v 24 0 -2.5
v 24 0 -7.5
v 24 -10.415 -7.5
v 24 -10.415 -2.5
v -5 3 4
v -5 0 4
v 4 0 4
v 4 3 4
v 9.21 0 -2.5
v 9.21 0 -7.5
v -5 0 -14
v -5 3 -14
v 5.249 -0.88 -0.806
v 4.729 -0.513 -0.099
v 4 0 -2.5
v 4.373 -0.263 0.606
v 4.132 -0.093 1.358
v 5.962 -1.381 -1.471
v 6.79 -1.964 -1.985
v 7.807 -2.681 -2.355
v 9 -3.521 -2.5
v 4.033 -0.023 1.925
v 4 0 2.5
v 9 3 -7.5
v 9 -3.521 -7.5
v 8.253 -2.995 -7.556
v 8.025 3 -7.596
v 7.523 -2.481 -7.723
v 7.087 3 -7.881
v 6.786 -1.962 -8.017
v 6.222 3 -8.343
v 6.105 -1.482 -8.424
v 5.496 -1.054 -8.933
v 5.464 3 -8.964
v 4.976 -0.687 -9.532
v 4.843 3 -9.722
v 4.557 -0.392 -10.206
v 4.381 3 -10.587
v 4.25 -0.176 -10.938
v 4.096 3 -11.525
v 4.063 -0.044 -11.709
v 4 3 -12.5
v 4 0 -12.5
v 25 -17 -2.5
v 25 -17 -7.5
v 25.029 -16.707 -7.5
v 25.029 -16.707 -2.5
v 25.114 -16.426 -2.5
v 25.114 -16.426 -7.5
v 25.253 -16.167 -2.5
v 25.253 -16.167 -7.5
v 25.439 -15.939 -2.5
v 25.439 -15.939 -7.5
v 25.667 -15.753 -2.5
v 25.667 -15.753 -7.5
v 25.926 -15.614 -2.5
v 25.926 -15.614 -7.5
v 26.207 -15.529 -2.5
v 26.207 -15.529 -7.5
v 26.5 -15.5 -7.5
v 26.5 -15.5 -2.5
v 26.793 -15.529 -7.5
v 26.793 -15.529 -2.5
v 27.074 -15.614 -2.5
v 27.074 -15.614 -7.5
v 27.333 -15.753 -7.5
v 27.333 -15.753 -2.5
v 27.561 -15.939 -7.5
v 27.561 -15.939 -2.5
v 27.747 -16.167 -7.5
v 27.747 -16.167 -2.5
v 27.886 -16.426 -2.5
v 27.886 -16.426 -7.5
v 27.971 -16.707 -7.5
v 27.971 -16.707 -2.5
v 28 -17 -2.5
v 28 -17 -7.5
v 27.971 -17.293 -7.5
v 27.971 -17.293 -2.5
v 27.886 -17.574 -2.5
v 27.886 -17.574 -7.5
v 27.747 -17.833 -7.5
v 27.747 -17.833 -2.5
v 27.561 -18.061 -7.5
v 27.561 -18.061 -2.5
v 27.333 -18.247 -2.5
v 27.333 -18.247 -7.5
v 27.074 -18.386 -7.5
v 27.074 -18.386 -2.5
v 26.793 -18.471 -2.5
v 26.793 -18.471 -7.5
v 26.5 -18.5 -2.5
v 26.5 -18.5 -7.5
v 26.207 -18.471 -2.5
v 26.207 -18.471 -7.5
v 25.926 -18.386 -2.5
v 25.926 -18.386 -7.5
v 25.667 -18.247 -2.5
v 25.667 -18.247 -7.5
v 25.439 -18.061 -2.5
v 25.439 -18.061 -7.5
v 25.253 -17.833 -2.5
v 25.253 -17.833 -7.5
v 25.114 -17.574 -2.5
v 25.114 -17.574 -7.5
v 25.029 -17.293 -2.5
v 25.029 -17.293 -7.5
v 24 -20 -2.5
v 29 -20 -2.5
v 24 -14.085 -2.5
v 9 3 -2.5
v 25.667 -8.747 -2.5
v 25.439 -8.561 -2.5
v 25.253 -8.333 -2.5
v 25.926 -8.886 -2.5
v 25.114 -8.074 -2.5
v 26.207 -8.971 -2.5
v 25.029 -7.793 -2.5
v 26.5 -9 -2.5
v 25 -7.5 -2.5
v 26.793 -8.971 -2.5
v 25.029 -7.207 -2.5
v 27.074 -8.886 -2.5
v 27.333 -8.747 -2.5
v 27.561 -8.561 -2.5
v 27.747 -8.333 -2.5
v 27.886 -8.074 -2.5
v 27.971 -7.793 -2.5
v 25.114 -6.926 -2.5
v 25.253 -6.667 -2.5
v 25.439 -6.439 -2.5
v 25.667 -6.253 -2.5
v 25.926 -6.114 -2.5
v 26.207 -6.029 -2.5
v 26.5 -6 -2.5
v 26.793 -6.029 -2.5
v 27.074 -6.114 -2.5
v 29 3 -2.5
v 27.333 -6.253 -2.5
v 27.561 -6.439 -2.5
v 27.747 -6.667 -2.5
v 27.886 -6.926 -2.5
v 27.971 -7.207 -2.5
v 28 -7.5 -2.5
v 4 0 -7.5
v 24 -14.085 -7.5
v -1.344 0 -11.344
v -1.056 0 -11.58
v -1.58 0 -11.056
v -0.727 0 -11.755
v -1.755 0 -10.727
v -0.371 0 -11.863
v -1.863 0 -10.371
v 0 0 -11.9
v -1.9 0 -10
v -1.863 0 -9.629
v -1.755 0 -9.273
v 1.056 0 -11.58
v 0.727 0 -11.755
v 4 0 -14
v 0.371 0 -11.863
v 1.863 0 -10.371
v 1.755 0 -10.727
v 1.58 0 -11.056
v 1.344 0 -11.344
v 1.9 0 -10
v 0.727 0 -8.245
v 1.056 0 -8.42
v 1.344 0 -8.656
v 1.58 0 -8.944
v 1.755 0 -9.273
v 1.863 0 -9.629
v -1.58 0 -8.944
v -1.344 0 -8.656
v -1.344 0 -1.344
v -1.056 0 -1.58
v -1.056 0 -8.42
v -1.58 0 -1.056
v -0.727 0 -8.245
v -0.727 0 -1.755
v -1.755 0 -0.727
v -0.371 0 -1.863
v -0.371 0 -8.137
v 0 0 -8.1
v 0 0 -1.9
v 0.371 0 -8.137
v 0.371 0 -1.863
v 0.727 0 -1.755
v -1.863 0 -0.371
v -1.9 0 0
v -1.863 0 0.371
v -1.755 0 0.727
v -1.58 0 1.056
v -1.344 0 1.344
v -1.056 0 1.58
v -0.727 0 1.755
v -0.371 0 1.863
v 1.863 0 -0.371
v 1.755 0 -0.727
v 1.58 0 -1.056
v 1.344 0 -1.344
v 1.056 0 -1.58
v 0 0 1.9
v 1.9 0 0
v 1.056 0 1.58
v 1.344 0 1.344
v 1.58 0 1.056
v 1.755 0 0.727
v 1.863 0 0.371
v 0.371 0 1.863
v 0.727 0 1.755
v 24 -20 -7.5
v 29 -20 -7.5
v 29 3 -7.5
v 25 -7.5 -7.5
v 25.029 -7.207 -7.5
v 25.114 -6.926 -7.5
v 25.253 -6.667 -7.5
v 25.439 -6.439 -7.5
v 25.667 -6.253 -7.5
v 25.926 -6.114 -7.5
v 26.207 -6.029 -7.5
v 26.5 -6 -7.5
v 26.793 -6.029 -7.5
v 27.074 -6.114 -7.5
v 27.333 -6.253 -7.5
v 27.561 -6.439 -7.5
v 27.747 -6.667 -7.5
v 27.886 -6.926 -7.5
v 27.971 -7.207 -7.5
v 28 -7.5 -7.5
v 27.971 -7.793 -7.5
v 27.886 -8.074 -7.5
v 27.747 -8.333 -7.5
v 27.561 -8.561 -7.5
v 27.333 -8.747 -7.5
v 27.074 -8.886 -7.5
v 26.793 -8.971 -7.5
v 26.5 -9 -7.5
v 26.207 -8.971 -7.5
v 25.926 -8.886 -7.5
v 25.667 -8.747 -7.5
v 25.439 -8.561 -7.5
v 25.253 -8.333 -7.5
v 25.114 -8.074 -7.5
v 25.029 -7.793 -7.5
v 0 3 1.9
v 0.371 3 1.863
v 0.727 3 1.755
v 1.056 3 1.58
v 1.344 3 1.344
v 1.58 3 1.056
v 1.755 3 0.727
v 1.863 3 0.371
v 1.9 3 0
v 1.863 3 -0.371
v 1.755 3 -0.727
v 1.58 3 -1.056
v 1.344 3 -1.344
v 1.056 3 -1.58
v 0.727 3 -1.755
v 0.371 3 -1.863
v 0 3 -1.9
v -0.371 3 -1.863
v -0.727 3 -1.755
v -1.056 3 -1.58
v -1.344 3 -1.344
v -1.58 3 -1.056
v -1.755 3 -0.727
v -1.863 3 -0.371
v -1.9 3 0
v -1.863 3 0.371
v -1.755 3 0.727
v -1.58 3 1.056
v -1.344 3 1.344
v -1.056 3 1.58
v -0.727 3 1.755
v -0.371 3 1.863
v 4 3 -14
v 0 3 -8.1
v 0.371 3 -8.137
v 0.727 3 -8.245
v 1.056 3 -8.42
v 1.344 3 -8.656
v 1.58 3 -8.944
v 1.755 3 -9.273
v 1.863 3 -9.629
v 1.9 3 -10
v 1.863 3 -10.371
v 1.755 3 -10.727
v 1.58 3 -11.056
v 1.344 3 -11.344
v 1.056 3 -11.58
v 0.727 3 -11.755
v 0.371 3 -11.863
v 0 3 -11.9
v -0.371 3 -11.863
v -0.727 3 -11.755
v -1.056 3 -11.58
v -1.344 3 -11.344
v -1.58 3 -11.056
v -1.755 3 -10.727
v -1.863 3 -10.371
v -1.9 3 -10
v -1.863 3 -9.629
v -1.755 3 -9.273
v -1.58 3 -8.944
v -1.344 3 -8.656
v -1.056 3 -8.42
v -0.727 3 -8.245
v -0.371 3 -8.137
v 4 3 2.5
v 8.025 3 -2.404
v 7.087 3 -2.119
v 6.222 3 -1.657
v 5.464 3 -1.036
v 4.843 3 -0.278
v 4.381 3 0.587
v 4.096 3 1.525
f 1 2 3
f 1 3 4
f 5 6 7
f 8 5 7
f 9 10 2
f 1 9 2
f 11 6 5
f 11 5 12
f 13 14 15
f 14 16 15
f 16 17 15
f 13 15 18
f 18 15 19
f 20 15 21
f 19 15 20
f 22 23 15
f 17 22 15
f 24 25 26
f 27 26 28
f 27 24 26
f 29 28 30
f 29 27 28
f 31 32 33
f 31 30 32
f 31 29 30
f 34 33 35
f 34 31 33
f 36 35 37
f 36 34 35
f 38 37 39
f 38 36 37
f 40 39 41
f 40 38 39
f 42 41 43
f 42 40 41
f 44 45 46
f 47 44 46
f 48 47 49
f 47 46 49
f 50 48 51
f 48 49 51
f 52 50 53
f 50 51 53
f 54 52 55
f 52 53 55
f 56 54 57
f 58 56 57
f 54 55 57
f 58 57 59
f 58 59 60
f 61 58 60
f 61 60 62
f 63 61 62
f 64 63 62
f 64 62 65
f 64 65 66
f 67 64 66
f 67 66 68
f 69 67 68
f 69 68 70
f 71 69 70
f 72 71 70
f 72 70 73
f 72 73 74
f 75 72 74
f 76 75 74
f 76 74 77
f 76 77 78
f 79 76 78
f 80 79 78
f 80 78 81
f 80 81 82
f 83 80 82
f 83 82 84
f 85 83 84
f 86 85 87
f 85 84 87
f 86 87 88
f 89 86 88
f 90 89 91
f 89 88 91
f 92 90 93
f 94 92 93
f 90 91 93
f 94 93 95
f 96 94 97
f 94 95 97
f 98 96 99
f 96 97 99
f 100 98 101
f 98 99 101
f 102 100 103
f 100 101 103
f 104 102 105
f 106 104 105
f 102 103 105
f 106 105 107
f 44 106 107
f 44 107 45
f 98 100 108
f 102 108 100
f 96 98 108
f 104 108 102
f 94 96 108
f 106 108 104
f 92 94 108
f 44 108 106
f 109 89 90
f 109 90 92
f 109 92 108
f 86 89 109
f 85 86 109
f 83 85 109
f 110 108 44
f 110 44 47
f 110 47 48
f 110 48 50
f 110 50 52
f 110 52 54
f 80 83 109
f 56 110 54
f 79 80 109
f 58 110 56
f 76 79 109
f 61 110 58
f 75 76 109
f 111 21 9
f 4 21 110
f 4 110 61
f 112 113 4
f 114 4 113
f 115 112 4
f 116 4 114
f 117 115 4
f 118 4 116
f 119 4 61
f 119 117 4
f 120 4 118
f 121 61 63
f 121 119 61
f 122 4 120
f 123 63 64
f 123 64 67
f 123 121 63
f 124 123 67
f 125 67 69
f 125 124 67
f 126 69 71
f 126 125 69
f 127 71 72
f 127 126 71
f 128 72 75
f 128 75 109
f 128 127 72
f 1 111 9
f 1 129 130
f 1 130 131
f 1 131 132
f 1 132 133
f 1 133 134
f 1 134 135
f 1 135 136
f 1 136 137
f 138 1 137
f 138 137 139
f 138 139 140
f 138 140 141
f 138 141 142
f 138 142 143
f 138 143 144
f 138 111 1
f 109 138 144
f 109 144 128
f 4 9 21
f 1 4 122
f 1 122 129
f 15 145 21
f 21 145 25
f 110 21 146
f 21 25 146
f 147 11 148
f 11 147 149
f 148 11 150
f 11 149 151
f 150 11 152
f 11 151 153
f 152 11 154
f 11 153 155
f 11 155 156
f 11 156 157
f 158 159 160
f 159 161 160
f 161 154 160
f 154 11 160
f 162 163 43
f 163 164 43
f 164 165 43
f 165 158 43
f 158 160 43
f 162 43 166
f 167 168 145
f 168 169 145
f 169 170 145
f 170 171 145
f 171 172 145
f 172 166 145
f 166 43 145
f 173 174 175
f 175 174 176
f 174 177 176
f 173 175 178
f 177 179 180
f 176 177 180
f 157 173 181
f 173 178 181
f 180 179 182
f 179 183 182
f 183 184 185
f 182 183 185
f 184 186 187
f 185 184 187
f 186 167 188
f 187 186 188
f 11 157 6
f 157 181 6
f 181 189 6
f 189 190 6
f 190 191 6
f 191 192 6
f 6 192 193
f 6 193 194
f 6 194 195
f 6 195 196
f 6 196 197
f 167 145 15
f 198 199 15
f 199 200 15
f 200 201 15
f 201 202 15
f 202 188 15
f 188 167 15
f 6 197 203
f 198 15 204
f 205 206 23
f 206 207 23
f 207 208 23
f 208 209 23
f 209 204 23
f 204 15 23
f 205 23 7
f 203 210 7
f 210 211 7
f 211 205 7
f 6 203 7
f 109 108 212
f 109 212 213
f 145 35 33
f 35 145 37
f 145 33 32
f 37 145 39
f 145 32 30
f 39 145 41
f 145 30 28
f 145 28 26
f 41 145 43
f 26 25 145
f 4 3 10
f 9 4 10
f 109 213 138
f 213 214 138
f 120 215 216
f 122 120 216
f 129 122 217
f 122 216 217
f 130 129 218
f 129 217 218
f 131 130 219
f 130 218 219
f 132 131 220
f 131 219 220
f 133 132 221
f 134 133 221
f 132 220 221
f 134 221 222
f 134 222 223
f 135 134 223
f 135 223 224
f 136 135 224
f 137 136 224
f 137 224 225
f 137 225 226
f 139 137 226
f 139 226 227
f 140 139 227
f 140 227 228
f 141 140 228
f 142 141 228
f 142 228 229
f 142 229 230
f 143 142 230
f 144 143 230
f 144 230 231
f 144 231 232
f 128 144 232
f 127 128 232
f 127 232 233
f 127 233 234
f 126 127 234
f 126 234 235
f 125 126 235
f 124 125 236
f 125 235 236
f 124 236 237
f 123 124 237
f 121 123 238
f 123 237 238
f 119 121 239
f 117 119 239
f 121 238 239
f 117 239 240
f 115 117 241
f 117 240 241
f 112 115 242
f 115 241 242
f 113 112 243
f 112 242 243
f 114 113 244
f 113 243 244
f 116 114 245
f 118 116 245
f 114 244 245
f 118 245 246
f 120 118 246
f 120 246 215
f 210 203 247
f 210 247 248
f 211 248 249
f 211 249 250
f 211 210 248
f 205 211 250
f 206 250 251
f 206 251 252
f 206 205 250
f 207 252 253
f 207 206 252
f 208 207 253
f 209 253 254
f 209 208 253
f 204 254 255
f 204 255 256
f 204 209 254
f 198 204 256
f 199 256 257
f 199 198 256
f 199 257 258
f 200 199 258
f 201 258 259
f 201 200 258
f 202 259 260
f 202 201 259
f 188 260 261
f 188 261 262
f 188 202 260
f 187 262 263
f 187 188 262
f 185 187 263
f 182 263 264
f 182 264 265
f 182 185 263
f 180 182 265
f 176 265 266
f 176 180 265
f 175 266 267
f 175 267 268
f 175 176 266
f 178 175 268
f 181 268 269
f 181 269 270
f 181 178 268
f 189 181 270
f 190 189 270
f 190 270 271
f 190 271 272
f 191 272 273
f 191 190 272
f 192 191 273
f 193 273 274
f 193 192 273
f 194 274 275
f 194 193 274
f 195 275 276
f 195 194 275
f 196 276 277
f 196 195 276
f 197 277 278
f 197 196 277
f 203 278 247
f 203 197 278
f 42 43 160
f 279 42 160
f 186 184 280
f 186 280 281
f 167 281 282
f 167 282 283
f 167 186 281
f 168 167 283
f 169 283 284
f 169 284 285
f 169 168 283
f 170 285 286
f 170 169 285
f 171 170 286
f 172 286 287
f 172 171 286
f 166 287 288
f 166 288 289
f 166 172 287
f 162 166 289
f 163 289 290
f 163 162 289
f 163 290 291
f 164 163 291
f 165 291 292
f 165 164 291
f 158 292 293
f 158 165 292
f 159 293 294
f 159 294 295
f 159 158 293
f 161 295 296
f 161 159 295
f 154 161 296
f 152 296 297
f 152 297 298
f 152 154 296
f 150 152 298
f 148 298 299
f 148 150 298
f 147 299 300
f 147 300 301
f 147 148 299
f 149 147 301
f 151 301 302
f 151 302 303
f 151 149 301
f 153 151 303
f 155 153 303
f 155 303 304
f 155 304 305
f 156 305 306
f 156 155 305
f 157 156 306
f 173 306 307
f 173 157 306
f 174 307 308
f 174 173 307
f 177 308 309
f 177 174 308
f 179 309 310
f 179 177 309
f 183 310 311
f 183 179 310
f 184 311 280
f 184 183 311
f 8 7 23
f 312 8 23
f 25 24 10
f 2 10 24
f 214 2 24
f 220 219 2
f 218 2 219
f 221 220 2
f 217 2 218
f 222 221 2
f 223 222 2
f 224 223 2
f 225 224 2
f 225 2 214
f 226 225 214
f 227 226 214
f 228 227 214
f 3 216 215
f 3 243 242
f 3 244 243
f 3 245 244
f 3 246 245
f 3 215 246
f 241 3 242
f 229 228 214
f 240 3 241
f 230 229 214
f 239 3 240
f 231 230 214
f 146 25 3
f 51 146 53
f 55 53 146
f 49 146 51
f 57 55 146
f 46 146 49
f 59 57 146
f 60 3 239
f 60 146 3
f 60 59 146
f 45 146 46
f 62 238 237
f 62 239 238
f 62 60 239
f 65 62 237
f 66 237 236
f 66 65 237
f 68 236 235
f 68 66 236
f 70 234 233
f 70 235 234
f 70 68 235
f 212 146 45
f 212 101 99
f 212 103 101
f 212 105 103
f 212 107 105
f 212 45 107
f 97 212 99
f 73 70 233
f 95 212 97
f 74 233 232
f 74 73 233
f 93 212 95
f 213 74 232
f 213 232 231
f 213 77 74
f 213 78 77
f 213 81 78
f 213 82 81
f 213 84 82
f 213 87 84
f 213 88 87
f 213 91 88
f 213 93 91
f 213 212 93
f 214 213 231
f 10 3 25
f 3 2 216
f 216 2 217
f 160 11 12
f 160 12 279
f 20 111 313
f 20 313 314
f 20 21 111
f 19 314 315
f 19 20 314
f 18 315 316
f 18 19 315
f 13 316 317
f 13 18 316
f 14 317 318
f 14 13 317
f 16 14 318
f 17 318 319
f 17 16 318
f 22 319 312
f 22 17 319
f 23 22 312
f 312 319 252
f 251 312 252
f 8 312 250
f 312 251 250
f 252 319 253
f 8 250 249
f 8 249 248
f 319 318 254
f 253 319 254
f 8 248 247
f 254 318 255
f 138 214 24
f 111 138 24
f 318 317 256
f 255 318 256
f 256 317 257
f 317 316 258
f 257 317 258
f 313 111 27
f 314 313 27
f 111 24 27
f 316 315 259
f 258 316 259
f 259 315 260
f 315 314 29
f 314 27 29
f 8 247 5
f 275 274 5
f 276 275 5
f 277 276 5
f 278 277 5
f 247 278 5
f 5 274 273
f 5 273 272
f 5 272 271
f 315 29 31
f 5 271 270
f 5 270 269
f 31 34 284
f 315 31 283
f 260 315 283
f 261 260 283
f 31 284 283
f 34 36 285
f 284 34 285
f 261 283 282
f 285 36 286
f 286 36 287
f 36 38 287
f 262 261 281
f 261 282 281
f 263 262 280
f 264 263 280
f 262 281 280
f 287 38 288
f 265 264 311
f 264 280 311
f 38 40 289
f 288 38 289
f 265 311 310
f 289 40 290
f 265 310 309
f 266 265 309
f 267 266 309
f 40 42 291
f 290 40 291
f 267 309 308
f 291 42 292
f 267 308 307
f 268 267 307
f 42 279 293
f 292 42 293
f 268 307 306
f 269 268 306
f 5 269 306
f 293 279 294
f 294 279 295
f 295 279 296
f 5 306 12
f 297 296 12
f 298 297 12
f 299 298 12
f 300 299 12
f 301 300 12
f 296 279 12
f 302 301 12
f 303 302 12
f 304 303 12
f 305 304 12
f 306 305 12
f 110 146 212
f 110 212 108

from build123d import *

# Parameters (mm, degrees)
SKETCH1_W                       = 9
SKETCH1_H                       = 18
SKETCH1_R                       = 1.9
BODY_MOUNT_DEPTH                = 3
SKETCH2_W                       = 5
SKETCH2_H                       = 3
BOSS_EXTRUDE2_DEPTH             = 25
SKETCH3_W                       = 5
SKETCH3_H                       = 5
BOSS_EXTRUDE3_DEPTH             = 20
SKETCH4_R                       = 1.5
CUT_EXTRUDE1_DEPTH              = 20
BOSS_EXTRUDE4_REACH             = 38.359
BOSS_EXTRUDE4_DIRECTION_2_REACH = 38.359
FILLET2_R                       = 5


with BuildPart() as part:
    # Sketch1 → body mount (new body)
    with BuildSketch(Plane(origin=(0, 0, 0), x_dir=(1, 0, 0), z_dir=(0, 1, 0))):
        with Locations((-0.5, 5)):
            Rectangle(SKETCH1_W, SKETCH1_H)
        with Locations(Location((0, 0, 0), (0, 0, 270))):
            Circle(SKETCH1_R, mode=Mode.SUBTRACT)
        with Locations(Location((0, 10, 0), (0, 0, 270))):
            Circle(SKETCH1_R, mode=Mode.SUBTRACT)
    extrude(amount=BODY_MOUNT_DEPTH)

    # Sketch2 → Boss-Extrude2 (add)
    with BuildSketch(Plane(origin=(4, 0, 0), x_dir=(0, 0, -1), z_dir=(1, 0, 0))):
        with Locations((5, 1.5)):
            Rectangle(SKETCH2_W, SKETCH2_H)
    extrude(amount=BOSS_EXTRUDE2_DEPTH)

    # Sketch3 → Boss-Extrude3 (add)
    with BuildSketch(Plane.XZ):
        with Locations((26.5, -5)):
            Rectangle(SKETCH3_W, SKETCH3_H)
    extrude(amount=BOSS_EXTRUDE3_DEPTH)

    # Sketch4 → Cut-Extrude1 (cut)
    with BuildSketch(Plane(origin=(0, 0, -7.5), x_dir=(-1, 0, 0), z_dir=(0, 0, -1))):
        with Locations((-26.5, -17)):
            Circle(SKETCH4_R)
        with Locations((-26.5, -7.5)):
            Circle(SKETCH4_R)
    extrude(amount=-CUT_EXTRUDE1_DEPTH, mode=Mode.SUBTRACT)

    # Boss-Extrude4: up to this face of the body (flat: up to its plane)
    boss_extrude4_end = Plane(part.part.faces().sort_by_distance((16.5, 2.660294245, -7.5))[0])
    # Sketch5 → Boss-Extrude4 (add, up to the picked face)
    with BuildSketch(Plane(origin=(0, 0, -5), x_dir=(-1, 0, 0), z_dir=(0, 0, -1)), mode=Mode.PRIVATE) as boss_extrude4_sk1:
        Polygon((-24, -10.415369352), (-9.210305315, 0), (-4, 0), (-24, -14.084630648), align=None)
    boss_extrude4_tool1 = split(extrude(boss_extrude4_sk1.sketch, amount=BOSS_EXTRUDE4_REACH, mode=Mode.PRIVATE), bisect_by=boss_extrude4_end, keep=Keep.BOTH, mode=Mode.PRIVATE)
    add(boss_extrude4_tool1.solids().sort_by(Axis((15.237549, -6.170794, -5), (0, 0, -1)))[0])

    # Boss-Extrude4 direction 2: up to this face of the body (flat: up to its plane)
    boss_extrude4_direction_2_end = Plane(part.part.faces().sort_by_distance((14, 0.339705755, -2.5))[0])
    # Sketch5 → Boss-Extrude4 direction 2 (add, up to the picked face)
    with BuildSketch(Plane(origin=(0, 0, -5), x_dir=(-1, 0, 0), z_dir=(0, 0, -1)), mode=Mode.PRIVATE) as boss_extrude4_direction_2_sk1:
        Polygon((-24, -10.415369352), (-9.210305315, 0), (-4, 0), (-24, -14.084630648), align=None)
    boss_extrude4_direction_2_tool1 = split(extrude(boss_extrude4_direction_2_sk1.sketch, amount=-BOSS_EXTRUDE4_DIRECTION_2_REACH, mode=Mode.PRIVATE), bisect_by=boss_extrude4_direction_2_end, keep=Keep.BOTH, mode=Mode.PRIVATE)
    add(boss_extrude4_direction_2_tool1.solids().sort_by(Axis((15.237549, -6.170794, -5), (0, 0, 1)))[0])

    # Fillet2
    # the kernel refuses this fillet: 5 mm, written as the material it adds along each edge
    with BuildSketch(Plane(origin=(4, 3, -7.5), x_dir=(0, 0, -1), z_dir=(0, -1, 0))) as fillet2_piece_1_section:
        with BuildLine():
            CenterArc((FILLET2_R, FILLET2_R), FILLET2_R, 180, 90)
            Line((0, FILLET2_R), (0, 0))
            Line((0, 0), (FILLET2_R, 0))
        make_face()
    fillet2_piece_1 = extrude(amount=3, mode=Mode.PRIVATE)
    fillet2_piece_1 = split(fillet2_piece_1, bisect_by=Plane(origin=(4.050655402, -0.035673131, -8.630736825), z_dir=(0.5757819971310116, 0.8176032606220598, 0)), keep=Keep.TOP, mode=Mode.PRIVATE)
    add(fillet2_piece_1)
    with BuildSketch(Plane(origin=(4, 3, -7.5), x_dir=(0, 0, -1), z_dir=(0, -1, 0))) as fillet2_piece_2_section:
        with BuildLine():
            CenterArc((FILLET2_R, FILLET2_R), FILLET2_R, 180, 90)
            Line((0, FILLET2_R), (0, 0))
            Line((0, 0), (FILLET2_R, 0))
        make_face()
    fillet2_piece_2 = extrude(amount=15.5, mode=Mode.PRIVATE)
    fillet2_piece_2 = split(fillet2_piece_2, bisect_by=Plane(origin=(6.150590259, 0, -8.032362576), z_dir=(0, -1, 0)), keep=Keep.TOP, mode=Mode.PRIVATE)
    fillet2_piece_2 = split(fillet2_piece_2, bisect_by=Plane(origin=(5.79410314, -1.263464003, -8.032362576), z_dir=(0.5757819971310116, 0.8176032606220598, 0)), keep=Keep.TOP, mode=Mode.PRIVATE)
    add(fillet2_piece_2)
    with BuildSketch(Plane(origin=(4, -12.5, -2.5), x_dir=(1, 0, 0), z_dir=(0, 1, 0))) as fillet2_piece_3_section:
        with BuildLine():
            CenterArc((FILLET2_R, -FILLET2_R), FILLET2_R, 90, 90)
            Line((0, -FILLET2_R), (0, 0))
            Line((0, 0), (FILLET2_R, 0))
        make_face()
    fillet2_piece_3 = extrude(amount=15.5, mode=Mode.PRIVATE)
    fillet2_piece_3 = split(fillet2_piece_3, bisect_by=Plane(origin=(5.79410314, -1.263464003, -1.967637424), z_dir=(0.5757819971310116, 0.8176032606220598, 0)), keep=Keep.TOP, mode=Mode.PRIVATE)
    fillet2_piece_3 = split(fillet2_piece_3, bisect_by=Plane(origin=(6.150590259, 0, -1.967637424), z_dir=(0, -1, 0)), keep=Keep.TOP, mode=Mode.PRIVATE)
    add(fillet2_piece_3)
    with BuildSketch(Plane(origin=(4, 0, -2.5), x_dir=(1, 0, 0), z_dir=(0, 1, 0))) as fillet2_piece_4_section:
        with BuildLine():
            CenterArc((FILLET2_R, -FILLET2_R), FILLET2_R, 90, 90)
            Line((0, -FILLET2_R), (0, 0))
            Line((0, 0), (FILLET2_R, 0))
        make_face()
    fillet2_piece_4 = extrude(amount=3, mode=Mode.PRIVATE)
    fillet2_piece_4 = split(fillet2_piece_4, bisect_by=Plane(origin=(4.050655402, -0.035673131, -1.369263175), z_dir=(0.5757819971310116, 0.8176032606220598, 0)), keep=Keep.TOP, mode=Mode.PRIVATE)
    add(fillet2_piece_4)


solid = part.part
